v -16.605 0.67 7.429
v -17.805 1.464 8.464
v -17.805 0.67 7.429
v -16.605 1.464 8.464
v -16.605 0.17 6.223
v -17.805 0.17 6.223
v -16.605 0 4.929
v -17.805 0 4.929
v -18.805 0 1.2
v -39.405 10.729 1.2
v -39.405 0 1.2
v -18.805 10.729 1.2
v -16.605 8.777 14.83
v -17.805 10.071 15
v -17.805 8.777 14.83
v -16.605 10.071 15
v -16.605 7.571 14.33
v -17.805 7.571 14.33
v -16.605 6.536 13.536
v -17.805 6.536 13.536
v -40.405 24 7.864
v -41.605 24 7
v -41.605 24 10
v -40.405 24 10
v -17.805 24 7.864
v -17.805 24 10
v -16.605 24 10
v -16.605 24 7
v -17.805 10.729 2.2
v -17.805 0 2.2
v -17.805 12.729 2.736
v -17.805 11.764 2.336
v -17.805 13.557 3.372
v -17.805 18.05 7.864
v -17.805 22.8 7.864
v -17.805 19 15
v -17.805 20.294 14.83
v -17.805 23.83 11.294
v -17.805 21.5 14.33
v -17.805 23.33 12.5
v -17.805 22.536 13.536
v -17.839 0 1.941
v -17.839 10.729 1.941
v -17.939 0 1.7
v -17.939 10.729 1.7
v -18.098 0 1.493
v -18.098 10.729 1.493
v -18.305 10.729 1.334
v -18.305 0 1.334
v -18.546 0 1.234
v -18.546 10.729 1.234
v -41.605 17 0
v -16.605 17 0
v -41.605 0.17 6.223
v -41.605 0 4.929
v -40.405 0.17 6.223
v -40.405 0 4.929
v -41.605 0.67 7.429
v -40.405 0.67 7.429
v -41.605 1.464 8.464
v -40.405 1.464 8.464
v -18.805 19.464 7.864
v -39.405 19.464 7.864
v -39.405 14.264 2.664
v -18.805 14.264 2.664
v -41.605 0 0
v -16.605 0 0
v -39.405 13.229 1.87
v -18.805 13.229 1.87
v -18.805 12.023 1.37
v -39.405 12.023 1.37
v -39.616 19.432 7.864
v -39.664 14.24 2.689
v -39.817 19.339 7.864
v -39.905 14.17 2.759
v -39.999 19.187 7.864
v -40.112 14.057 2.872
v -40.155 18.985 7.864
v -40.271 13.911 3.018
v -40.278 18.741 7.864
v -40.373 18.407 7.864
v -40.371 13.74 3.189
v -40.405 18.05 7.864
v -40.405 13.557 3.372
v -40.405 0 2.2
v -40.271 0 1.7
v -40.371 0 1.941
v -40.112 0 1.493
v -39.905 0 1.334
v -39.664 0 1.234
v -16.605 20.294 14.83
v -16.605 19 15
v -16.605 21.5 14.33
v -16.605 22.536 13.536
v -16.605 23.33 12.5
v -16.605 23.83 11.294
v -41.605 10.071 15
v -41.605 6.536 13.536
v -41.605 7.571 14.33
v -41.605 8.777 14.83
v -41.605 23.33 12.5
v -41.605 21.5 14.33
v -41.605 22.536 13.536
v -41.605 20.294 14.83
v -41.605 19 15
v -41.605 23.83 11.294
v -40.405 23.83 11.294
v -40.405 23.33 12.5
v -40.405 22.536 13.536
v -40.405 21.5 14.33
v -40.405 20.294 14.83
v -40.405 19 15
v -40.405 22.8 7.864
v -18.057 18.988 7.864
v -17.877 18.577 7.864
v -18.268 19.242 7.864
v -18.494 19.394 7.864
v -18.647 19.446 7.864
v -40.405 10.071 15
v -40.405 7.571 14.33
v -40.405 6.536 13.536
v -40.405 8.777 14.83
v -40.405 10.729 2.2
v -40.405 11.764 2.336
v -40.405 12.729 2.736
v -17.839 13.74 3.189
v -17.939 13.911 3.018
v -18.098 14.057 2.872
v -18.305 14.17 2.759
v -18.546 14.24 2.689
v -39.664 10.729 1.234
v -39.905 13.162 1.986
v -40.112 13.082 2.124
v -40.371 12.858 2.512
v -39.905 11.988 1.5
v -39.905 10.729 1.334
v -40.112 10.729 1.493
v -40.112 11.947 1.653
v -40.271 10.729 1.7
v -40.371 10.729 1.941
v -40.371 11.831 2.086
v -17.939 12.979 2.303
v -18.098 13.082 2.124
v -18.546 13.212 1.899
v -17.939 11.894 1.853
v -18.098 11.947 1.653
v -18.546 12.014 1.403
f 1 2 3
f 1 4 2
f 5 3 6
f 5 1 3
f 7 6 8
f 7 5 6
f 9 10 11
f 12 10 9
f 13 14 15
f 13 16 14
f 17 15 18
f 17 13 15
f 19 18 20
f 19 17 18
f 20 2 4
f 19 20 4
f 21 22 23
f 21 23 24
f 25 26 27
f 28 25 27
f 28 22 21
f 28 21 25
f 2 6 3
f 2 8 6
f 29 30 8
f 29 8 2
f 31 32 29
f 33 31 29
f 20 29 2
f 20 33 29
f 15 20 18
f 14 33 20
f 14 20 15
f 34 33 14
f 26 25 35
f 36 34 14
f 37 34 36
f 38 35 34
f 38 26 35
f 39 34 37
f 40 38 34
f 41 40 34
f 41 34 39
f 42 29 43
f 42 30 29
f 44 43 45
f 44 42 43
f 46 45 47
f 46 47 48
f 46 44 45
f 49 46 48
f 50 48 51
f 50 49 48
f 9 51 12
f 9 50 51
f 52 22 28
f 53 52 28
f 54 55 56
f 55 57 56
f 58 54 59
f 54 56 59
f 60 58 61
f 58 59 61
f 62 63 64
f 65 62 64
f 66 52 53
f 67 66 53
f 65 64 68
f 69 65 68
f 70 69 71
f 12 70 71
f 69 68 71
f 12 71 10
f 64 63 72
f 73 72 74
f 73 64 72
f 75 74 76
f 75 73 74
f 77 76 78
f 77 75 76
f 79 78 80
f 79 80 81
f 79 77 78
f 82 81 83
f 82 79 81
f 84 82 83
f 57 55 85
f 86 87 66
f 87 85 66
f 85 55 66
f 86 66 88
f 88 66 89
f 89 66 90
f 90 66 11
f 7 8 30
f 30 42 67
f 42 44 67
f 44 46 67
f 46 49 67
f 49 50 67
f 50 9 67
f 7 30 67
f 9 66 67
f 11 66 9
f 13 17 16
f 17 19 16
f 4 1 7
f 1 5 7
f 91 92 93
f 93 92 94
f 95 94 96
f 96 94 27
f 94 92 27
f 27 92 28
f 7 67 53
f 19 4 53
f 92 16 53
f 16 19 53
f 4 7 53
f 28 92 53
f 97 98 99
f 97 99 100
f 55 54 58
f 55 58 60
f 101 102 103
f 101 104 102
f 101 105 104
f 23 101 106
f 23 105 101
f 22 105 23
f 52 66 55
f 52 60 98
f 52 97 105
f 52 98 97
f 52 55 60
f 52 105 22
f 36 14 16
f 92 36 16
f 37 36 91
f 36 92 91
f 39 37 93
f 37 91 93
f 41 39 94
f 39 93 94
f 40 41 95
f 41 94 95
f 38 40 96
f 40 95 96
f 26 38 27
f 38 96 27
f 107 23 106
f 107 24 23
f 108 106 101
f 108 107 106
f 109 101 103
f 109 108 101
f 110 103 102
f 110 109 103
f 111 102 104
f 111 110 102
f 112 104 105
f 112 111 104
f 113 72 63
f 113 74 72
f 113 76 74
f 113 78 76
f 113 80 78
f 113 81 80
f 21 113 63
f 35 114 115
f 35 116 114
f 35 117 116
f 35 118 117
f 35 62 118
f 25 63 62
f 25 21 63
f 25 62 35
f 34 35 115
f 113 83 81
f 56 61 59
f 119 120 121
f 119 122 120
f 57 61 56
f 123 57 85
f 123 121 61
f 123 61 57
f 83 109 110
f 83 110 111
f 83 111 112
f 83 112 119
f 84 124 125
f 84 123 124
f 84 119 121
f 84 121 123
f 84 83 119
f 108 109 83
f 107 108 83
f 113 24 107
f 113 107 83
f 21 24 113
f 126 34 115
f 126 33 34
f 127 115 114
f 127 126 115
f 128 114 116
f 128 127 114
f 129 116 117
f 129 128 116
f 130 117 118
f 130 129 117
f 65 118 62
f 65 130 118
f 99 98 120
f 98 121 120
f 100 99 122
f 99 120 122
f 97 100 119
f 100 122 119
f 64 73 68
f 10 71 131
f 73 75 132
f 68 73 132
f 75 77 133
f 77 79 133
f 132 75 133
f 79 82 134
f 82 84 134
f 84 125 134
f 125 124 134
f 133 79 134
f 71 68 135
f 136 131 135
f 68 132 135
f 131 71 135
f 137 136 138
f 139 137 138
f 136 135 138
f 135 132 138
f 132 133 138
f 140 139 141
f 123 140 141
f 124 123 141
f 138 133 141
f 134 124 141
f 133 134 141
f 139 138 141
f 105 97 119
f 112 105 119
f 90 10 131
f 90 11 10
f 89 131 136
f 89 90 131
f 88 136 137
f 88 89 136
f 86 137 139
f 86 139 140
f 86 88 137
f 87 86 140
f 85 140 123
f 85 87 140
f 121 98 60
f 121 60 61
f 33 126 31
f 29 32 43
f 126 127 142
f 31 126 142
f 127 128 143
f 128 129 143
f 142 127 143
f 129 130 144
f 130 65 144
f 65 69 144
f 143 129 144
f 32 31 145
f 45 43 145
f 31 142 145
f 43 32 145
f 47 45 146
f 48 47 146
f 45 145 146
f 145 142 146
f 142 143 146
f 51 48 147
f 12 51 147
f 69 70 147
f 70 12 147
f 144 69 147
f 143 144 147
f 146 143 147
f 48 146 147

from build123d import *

# Parameters (mm, degrees)
F0_W        = 25
F0_H        = 24
F1_DEPTH    = 15
F2_T        = -1.2
F3_DEPTH    = 25
F4_W        = 22.6
F4_H        = 7.1360613033
F5_DEPTH    = 25
F6_T4_DEPTH = 22.6
F7_R        = 5
F8_SIZE     = 8
F9_R        = 5
F10_R       = 1
F11_SIZE    = 7


# Not quite as in the source:
# - a fillet or chamfer that OpenCascade refuses, or shapes differently, is made with other operations: its cross-section is extruded or revolved along the edge and cut away or added


with BuildPart() as f1:
    # F0 (on Top) → F1 (new body)
    with BuildSketch(Plane.XY):
        with Locations((-29.1051699208, 12)):
            Rectangle(F0_W, F0_H)
    extrude(amount=F1_DEPTH)

    # F2
    f2_openings = [f1.faces().sort_by_distance(p)[0] for p in [
        (-29.10517, 12, 15),
    ]]
    offset(amount=F2_T, openings=f2_openings)

    # F3 (cut): a face of the model
    f3_faces = [f1.faces().sort_by_distance(p)[0] for p in [
        (-29.1051699208, 1.2, 8.1),
    ]]
    extrude(f3_faces, amount=-F3_DEPTH, mode=Mode.SUBTRACT)

    # F4 (on face) → F5 (cut)
    with BuildSketch(Plane.XZ.offset(-22.8)):
        with Locations((-29.1051699208, 11.4319693483)):
            Rectangle(F4_W, F4_H)
    extrude(amount=-F5_DEPTH, mode=Mode.SUBTRACT)

    # F6: chamfer of 10 on 1 edges, made by hand


with BuildPart() as f6_tool2:
    # F6_s3 → F6_t4 (new body)
    with BuildSketch(Plane.YZ.offset(-17.8051699208)):
        Polygon((22.8, 11.2), (12.8, 1.2), (22.8, 1.2), align=None)
    extrude(amount=-F6_T4_DEPTH)

    split(bisect_by=Plane.XY.offset(7.8639386967), keep=Keep.BOTTOM)


with BuildPart() as f1_1:
    add(f1.part)

    # F6_t1: union F6_tool2
    add(f6_tool2.part)

    # F7
    f7_edges = [f1_1.edges().sort_by_distance(p)[0] for p in [
        (-29.10517, 12.8, 1.2),
        (-17.20517, 24, 15),
        (-41.00517, 24, 15),
    ]]
    fillet(f7_edges, radius=F7_R)

    # F8
    f8_edges = [f1_1.edges().sort_by_distance(p)[0] for p in [
        (-41.00517, 0, 15),
        (-17.20517, 0, 15),
    ]]
    chamfer(f8_edges, length=F8_SIZE)

    # F9
    f9_edges = [f1_1.edges().sort_by_distance(p)[0] for p in [
        (-41.00517, 8, 15),
        (-41.00517, 0, 7),
        (-17.20517, 0, 7),
        (-17.20517, 8, 15),
    ]]
    fillet(f9_edges, radius=F9_R)

    # F10
    f10_edges = [f1_1.edges().sort_by_distance(p)[0] for p in [
        (-40.40517, 5.364466, 1.2),
        (-17.80517, 5.364466, 1.2),
        (-17.80517, 12.642349, 1.580602),
        (-17.80517, 16.864202, 5.264202),
        (-40.40517, 16.864202, 5.264202),
        (-40.40517, 12.642349, 1.580602),
    ]]
    fillet(f10_edges, radius=F10_R)

    # F11
    f11_edges = [f1_1.edges().sort_by_distance(p)[0] for p in [
        (-29.10517, 24, 0),
    ]]
    chamfer(f11_edges, length=F11_SIZE)


solid = f1_1.part
